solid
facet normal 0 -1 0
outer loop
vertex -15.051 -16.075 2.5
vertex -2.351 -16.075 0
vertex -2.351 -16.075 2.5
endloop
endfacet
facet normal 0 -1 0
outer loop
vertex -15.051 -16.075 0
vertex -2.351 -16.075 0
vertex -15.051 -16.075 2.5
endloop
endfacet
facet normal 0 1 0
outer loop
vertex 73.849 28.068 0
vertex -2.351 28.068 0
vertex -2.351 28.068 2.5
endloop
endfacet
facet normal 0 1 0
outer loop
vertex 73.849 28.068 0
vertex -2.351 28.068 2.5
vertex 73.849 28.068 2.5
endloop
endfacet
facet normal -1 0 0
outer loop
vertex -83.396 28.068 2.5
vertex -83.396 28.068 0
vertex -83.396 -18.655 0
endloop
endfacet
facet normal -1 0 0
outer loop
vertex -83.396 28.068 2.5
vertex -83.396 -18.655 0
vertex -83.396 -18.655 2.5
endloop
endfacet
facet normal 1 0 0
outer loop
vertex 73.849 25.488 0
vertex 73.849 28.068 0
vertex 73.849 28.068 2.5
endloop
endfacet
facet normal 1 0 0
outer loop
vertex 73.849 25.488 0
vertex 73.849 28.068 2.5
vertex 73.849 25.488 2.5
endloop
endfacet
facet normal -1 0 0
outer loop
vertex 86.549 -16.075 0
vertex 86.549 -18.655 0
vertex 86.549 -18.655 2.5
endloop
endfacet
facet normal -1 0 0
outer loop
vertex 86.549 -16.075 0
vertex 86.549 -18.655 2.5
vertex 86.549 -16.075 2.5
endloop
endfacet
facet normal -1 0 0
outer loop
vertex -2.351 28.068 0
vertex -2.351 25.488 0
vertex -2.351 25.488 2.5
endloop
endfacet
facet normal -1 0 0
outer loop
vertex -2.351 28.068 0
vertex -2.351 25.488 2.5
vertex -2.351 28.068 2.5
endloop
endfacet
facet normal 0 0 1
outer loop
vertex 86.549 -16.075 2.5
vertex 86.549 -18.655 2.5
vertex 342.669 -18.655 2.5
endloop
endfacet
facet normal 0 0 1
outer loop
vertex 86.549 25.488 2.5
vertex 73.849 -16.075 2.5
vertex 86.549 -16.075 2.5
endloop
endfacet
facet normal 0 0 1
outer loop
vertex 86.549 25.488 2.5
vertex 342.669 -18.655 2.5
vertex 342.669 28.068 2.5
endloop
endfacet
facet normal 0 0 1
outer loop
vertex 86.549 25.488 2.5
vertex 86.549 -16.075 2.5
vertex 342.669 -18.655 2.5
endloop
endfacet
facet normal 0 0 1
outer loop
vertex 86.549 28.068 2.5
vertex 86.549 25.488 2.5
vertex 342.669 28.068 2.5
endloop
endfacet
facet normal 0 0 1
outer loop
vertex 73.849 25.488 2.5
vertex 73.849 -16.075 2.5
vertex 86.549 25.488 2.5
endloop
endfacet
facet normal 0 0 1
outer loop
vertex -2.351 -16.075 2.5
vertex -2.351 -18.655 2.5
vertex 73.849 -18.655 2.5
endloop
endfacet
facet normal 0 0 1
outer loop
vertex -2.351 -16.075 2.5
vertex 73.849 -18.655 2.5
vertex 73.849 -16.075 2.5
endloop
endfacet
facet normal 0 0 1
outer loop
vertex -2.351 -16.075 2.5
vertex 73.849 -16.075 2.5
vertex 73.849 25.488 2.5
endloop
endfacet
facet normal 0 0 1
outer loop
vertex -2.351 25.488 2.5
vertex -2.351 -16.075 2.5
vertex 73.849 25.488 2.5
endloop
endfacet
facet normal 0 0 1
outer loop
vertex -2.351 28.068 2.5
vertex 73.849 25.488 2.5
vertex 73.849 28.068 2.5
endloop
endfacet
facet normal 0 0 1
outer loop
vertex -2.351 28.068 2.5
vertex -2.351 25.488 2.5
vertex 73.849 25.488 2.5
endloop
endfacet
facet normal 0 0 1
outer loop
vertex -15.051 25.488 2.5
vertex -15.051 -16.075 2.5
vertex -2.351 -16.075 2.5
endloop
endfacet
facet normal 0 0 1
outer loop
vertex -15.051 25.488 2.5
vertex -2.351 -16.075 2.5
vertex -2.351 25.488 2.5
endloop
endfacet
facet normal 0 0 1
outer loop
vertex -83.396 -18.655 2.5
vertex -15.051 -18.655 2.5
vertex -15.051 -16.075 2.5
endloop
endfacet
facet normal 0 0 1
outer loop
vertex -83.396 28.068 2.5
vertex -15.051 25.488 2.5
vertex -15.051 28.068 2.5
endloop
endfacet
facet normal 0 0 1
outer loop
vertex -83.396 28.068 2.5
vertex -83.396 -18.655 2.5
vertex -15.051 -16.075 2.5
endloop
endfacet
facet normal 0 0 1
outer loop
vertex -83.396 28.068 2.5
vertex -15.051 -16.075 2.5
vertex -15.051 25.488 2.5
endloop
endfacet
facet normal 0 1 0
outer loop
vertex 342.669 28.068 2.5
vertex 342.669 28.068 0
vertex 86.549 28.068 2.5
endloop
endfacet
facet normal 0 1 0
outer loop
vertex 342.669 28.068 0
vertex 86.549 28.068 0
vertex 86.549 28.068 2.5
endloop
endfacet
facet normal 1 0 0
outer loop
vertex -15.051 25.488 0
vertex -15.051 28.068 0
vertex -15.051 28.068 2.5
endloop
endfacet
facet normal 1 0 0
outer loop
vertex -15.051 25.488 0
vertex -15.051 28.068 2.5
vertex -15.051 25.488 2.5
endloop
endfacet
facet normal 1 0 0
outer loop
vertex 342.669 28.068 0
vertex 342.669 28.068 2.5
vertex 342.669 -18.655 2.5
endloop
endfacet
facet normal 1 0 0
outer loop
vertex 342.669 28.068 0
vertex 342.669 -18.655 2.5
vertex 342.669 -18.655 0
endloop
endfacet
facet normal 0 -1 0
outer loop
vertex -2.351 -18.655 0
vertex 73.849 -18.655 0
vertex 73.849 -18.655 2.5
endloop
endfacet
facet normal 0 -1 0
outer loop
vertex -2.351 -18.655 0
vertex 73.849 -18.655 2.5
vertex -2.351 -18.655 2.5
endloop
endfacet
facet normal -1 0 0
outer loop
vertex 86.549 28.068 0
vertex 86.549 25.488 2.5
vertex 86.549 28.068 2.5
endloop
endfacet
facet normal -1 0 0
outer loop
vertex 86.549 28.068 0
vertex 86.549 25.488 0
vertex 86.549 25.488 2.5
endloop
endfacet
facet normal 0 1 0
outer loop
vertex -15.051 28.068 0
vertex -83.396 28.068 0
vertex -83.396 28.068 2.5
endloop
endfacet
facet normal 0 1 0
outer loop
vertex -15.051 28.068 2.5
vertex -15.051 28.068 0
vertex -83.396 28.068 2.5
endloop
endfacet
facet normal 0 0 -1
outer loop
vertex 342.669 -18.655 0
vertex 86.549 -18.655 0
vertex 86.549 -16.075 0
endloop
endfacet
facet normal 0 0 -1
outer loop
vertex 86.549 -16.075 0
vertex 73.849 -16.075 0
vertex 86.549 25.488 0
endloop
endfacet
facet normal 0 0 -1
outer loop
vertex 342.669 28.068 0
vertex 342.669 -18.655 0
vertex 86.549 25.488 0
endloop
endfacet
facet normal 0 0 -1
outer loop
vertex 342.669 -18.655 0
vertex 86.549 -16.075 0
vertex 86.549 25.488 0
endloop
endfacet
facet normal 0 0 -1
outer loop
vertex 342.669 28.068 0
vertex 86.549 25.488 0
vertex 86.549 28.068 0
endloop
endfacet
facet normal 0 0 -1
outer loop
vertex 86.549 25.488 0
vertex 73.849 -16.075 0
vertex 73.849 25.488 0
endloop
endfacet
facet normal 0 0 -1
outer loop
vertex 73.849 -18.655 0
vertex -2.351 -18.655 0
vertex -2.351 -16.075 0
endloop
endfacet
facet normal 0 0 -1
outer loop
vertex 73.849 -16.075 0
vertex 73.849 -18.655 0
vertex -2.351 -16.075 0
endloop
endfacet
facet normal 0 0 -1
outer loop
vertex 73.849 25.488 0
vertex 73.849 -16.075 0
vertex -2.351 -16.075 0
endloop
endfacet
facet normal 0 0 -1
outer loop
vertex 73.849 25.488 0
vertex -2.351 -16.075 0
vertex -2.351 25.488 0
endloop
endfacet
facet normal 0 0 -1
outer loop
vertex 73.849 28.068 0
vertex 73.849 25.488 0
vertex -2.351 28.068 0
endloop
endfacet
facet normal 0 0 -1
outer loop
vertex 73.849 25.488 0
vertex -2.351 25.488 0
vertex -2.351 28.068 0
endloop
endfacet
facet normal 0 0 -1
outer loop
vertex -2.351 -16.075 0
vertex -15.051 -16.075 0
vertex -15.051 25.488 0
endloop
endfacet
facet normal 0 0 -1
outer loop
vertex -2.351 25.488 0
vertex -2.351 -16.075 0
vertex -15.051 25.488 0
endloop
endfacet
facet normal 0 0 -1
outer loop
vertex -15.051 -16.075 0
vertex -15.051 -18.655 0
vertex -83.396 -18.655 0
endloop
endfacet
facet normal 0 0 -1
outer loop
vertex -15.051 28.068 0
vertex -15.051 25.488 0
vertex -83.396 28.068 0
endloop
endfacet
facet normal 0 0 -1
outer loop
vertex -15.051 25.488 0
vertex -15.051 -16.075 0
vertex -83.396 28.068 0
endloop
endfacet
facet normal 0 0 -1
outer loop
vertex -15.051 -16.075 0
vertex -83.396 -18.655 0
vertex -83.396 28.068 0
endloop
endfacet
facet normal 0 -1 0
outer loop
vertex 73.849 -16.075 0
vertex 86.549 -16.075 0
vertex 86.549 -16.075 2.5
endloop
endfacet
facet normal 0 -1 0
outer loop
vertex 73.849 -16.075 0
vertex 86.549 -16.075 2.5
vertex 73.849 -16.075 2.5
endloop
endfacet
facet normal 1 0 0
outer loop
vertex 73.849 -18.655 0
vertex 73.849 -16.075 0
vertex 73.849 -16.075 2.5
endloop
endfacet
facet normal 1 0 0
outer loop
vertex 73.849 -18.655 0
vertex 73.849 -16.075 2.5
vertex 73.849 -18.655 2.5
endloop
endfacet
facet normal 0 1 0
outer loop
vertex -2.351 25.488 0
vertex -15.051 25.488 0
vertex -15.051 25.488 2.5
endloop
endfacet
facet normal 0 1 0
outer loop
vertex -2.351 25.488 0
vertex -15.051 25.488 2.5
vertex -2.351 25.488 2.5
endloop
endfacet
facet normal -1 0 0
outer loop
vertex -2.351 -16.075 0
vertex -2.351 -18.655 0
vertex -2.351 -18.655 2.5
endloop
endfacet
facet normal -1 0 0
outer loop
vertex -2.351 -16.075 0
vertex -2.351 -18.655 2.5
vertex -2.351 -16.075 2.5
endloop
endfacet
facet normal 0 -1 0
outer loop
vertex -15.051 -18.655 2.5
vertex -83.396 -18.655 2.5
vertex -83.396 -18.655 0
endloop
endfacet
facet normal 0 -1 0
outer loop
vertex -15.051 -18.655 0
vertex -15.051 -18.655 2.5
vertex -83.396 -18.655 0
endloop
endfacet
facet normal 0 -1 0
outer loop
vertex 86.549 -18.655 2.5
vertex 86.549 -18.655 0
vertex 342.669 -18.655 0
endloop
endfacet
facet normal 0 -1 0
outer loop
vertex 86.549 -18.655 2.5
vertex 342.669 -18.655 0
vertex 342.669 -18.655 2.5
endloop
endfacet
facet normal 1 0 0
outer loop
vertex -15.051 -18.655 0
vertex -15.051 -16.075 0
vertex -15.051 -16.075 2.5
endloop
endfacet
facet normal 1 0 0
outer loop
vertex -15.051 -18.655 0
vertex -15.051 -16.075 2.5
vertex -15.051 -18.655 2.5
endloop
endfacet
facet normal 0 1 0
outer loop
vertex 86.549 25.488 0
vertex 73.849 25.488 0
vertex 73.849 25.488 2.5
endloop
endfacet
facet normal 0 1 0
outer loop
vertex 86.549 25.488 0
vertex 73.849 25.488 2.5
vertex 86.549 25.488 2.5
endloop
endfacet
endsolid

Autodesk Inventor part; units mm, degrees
ref_plane "YZ Plane" through (0, 0, 0) normal (1, 0, 0) x (0, 1, 0)
ref_plane "XZ Plane" through (0, 0, 0) normal (0, 1, 0) x (-1, 0, 0)
ref_plane "XY Plane" through (0, 0, 0) normal (0, 0, 1) x (1, 0, 0)
sketch "Sketch1" plane through (0, 0, 0) normal (0, 0, 1) x (1, 0, 0)
  line L0 (86.5491, 25.4876) -> (86.5491, 28.0676)
  line L1 (86.5491, 28.0676) -> (86.5491, 25.4876)
  line L2 (73.8491, 25.4876) -> (86.5491, 25.4876)
  line L3 (86.5491, 25.4876) -> (73.8491, 25.4876)
  line L4 (86.5491, 28.0676) -> (217.6691, 28.0676)
  line L5 (217.6691, 28.0676) -> (86.5491, 28.0676)
  line L6 (217.6691, 28.0676) -> (217.6691, -18.6554)
  line L7 (217.6691, -18.6554) -> (217.6691, 28.0676)
  line L8 (86.5491, -18.6554) -> (217.6691, -18.6554)
  line L9 (217.6691, -18.6554) -> (86.5491, -18.6554)
  line L10 (-230.8205, -18.6554) -> (-230.8205, 28.0676)
  line L11 (-230.8205, 28.0676) -> (-230.8205, -18.6554)
  line L12 (-230.8205, 28.0676) -> (-230.8205, -18.6554)
  line L13 (-230.8205, -18.6554) -> (-230.8205, 28.0676)
  line L14 (-15.0509, -16.0754) -> (-15.0509, -18.6554)
  line L15 (-15.0509, -18.6554) -> (-15.0509, -16.0754)
  line L16 (-2.3509, 25.4876) -> (-2.3509, 28.0676)
  line L17 (-2.3509, 28.0676) -> (-2.3509, 25.4876)
  line L18 (-15.0509, 25.4876) -> (-2.3509, 25.4876)
  line L19 (-2.3509, 25.4876) -> (-15.0509, 25.4876)
  line L20 (-15.0509, 28.0676) -> (-15.0509, 25.4876)
  line L21 (-15.0509, 25.4876) -> (-15.0509, 28.0676)
  line L22 (-2.3509, -16.0754) -> (-15.0509, -16.0754)
  line L23 (-15.0509, -16.0754) -> (-2.3509, -16.0754)
  line L24 (-15.0509, 25.4876) -> (-15.0509, 28.0676)
  line L25 (-15.0509, 28.0676) -> (-15.0509, 25.4876)
  line L26 (-15.0509, -18.6554) -> (-15.0509, -16.0754)
  line L27 (-15.0509, -16.0754) -> (-15.0509, -18.6554)
  line L28 (-2.3509, 25.4876) -> (-15.0509, 25.4876)
  line L29 (-15.0509, 25.4876) -> (-2.3509, 25.4876)
  line L30 (-15.0509, -16.0754) -> (-2.3509, -16.0754)
  line L31 (-2.3509, -16.0754) -> (-15.0509, -16.0754)
  line L32 (-230.8205, 28.0676) -> (-15.0509, 28.0676)
  line L33 (-15.0509, 28.0676) -> (-230.8205, 28.0676)
  line L34 (-15.0509, 28.0676) -> (-230.8205, 28.0676)
  line L35 (-230.8205, 28.0676) -> (-15.0509, 28.0676)
  line L36 (-230.8205, -18.6554) -> (-15.0509, -18.6554)
  line L37 (-230.8205, -18.6554) -> (-15.0509, -18.6554)
  line L38 (-15.0509, -18.6554) -> (-230.8205, -18.6554)
  line L39 (-15.0509, -18.6554) -> (-230.8205, -18.6554)
  line L40 (-2.3509, -18.6554) -> (-2.3509, -16.0754)
  line L41 (73.8491, 28.0676) -> (73.8491, 25.4876)
  line L42 (73.8491, 25.4876) -> (73.8491, 28.0676)
  line L43 (-2.3509, 28.0676) -> (73.8491, 28.0676)
  line L44 (73.8491, 28.0676) -> (-2.3509, 28.0676)
  line L45 (86.5491, -18.6554) -> (86.5491, -16.0754)
  line L46 (86.5491, -16.0754) -> (86.5491, -18.6554)
  line L47 (86.5491, -16.0754) -> (73.8491, -16.0754)
  line L48 (73.8491, -16.0754) -> (86.5491, -16.0754)
  line L49 (-2.3509, -16.0754) -> (-2.3509, -18.6554)
  line L50 (-2.3509, 28.0676) -> (-2.3509, 25.4876)
  line L51 (-2.3509, 25.4876) -> (-2.3509, 28.0676)
  line L52 (-2.3509, -16.0754) -> (-2.3509, -18.6554)
  line L53 (-2.3509, -18.6554) -> (-2.3509, -16.0754)
  line L54 (73.8491, -18.6554) -> (-2.3509, -18.6554)
  line L55 (-2.3509, -18.6554) -> (73.8491, -18.6554)
  line L56 (-2.3509, -18.6554) -> (73.8491, -18.6554)
  line L57 (73.8491, -18.6554) -> (-2.3509, -18.6554)
  line L58 (73.8491, 28.0676) -> (-2.3509, 28.0676)
  line L59 (-2.3509, 28.0676) -> (73.8491, 28.0676)
  line L60 (73.8491, -16.0754) -> (73.8491, -18.6554)
  line L61 (73.8491, -18.6554) -> (73.8491, -16.0754)
  line L62 (73.8491, -18.6554) -> (73.8491, -16.0754)
  line L63 (73.8491, -16.0754) -> (73.8491, -18.6554)
  line L64 (73.8491, -16.0754) -> (86.5491, -16.0754)
  line L65 (86.5491, -16.0754) -> (73.8491, -16.0754)
  line L66 (86.5491, 25.4876) -> (73.8491, 25.4876)
  line L67 (73.8491, 25.4876) -> (86.5491, 25.4876)
  line L68 (73.8491, 25.4876) -> (73.8491, 28.0676)
  line L69 (73.8491, 28.0676) -> (73.8491, 25.4876)
  line L70 (86.5491, -16.0754) -> (86.5491, -18.6554)
  line L71 (86.5491, -18.6554) -> (86.5491, -16.0754)
  line L72 (217.6691, 28.0676) -> (86.5491, 28.0676)
  line L73 (86.5491, 28.0676) -> (217.6691, 28.0676)
  line L74 (217.6691, -18.6554) -> (217.6691, 28.0676)
  line L75 (217.6691, 28.0676) -> (217.6691, -18.6554)
  line L76 (86.5491, 28.0676) -> (86.5491, 25.4876)
  line L77 (86.5491, 25.4876) -> (86.5491, 28.0676)
  line L78 (86.5491, -18.6554) -> (217.6691, -18.6554)
  line L79 (217.6691, -18.6554) -> (86.5491, -18.6554)
  point P0 (0, 0)
extrude "Extrusion1" add sketch "Sketch1" along normal blind 2.5
move faces "Move1" translate (23, 0, 0) faces at (217.6691, -3.081, 0.8333)
move faces "Move2" translate (2, 0, 0) faces at (240.6691, 12.4933, 1.6667)
sketch "Sketch2" plane through (0, 0, 2.5) normal (0, 0, 1) x (1, 0, 0)
  line L0 (-83.3964, 28.0676) -> (-230.8205, 28.0676)
  line L1 (-230.8205, 28.0676) -> (-230.8205, -18.6554)
  line L2 (-230.8205, -18.6554) -> (-83.3964, -18.6554)
  line L3 (-83.3964, -18.6554) -> (-83.3964, 28.0676)
extrude "Extrusion2" cut sketch "Sketch2" against normal blind 10
sketch "Sketch4" plane through (-83.3964, -18.6554, 2.5) normal (-1, 0, 0) x (0, 0, 1)
  line L0 (-2.5, 0) -> (-2.5, 46.723) projected
  line L1 (-2.5, 46.723) -> (0, 46.723) projected
  line L2 (0, 46.723) -> (0, 0) projected
  line L3 (0, 0) -> (-2.5, 0) projected
  point P0 (-2.5, 18.6554)
extrude "Extrusion3" add sketch "Sketch4" along normal blind 75
sketch "Sketch5" plane through (242.6691, -18.6554, 0) normal (1, 0, 0) x (0, 0, -1)
  line L0 (-2.5, 0) -> (-2.5, 46.723) projected
  line L1 (0, 46.723) -> (-2.5, 46.723) projected
  line L2 (0, 0) -> (0, 46.723) projected
  line L3 (0, 0) -> (-2.5, 0) projected
  point P0 (0, 18.6554)
extrude "Extrusion4" add sketch "Sketch5" along normal blind 100
sketch "Sketch6" plane through (-158.3964, -18.6554, 2.5) normal (-1, 0, 0) x (0, 0, 1)
  line L0 (-2.5, 46.723) -> (-2.5, 0) projected
  line L1 (0, 0) -> (0, 46.723) projected
  line L2 (0, 46.723) -> (-2.5, 46.723) projected
  line L3 (-2.5, 0) -> (0, 0) projected
  point P0 (-2.5, 18.6554)
extrude "Extrusion5" cut sketch "Sketch6" against normal blind 75
properties part number "New base"
